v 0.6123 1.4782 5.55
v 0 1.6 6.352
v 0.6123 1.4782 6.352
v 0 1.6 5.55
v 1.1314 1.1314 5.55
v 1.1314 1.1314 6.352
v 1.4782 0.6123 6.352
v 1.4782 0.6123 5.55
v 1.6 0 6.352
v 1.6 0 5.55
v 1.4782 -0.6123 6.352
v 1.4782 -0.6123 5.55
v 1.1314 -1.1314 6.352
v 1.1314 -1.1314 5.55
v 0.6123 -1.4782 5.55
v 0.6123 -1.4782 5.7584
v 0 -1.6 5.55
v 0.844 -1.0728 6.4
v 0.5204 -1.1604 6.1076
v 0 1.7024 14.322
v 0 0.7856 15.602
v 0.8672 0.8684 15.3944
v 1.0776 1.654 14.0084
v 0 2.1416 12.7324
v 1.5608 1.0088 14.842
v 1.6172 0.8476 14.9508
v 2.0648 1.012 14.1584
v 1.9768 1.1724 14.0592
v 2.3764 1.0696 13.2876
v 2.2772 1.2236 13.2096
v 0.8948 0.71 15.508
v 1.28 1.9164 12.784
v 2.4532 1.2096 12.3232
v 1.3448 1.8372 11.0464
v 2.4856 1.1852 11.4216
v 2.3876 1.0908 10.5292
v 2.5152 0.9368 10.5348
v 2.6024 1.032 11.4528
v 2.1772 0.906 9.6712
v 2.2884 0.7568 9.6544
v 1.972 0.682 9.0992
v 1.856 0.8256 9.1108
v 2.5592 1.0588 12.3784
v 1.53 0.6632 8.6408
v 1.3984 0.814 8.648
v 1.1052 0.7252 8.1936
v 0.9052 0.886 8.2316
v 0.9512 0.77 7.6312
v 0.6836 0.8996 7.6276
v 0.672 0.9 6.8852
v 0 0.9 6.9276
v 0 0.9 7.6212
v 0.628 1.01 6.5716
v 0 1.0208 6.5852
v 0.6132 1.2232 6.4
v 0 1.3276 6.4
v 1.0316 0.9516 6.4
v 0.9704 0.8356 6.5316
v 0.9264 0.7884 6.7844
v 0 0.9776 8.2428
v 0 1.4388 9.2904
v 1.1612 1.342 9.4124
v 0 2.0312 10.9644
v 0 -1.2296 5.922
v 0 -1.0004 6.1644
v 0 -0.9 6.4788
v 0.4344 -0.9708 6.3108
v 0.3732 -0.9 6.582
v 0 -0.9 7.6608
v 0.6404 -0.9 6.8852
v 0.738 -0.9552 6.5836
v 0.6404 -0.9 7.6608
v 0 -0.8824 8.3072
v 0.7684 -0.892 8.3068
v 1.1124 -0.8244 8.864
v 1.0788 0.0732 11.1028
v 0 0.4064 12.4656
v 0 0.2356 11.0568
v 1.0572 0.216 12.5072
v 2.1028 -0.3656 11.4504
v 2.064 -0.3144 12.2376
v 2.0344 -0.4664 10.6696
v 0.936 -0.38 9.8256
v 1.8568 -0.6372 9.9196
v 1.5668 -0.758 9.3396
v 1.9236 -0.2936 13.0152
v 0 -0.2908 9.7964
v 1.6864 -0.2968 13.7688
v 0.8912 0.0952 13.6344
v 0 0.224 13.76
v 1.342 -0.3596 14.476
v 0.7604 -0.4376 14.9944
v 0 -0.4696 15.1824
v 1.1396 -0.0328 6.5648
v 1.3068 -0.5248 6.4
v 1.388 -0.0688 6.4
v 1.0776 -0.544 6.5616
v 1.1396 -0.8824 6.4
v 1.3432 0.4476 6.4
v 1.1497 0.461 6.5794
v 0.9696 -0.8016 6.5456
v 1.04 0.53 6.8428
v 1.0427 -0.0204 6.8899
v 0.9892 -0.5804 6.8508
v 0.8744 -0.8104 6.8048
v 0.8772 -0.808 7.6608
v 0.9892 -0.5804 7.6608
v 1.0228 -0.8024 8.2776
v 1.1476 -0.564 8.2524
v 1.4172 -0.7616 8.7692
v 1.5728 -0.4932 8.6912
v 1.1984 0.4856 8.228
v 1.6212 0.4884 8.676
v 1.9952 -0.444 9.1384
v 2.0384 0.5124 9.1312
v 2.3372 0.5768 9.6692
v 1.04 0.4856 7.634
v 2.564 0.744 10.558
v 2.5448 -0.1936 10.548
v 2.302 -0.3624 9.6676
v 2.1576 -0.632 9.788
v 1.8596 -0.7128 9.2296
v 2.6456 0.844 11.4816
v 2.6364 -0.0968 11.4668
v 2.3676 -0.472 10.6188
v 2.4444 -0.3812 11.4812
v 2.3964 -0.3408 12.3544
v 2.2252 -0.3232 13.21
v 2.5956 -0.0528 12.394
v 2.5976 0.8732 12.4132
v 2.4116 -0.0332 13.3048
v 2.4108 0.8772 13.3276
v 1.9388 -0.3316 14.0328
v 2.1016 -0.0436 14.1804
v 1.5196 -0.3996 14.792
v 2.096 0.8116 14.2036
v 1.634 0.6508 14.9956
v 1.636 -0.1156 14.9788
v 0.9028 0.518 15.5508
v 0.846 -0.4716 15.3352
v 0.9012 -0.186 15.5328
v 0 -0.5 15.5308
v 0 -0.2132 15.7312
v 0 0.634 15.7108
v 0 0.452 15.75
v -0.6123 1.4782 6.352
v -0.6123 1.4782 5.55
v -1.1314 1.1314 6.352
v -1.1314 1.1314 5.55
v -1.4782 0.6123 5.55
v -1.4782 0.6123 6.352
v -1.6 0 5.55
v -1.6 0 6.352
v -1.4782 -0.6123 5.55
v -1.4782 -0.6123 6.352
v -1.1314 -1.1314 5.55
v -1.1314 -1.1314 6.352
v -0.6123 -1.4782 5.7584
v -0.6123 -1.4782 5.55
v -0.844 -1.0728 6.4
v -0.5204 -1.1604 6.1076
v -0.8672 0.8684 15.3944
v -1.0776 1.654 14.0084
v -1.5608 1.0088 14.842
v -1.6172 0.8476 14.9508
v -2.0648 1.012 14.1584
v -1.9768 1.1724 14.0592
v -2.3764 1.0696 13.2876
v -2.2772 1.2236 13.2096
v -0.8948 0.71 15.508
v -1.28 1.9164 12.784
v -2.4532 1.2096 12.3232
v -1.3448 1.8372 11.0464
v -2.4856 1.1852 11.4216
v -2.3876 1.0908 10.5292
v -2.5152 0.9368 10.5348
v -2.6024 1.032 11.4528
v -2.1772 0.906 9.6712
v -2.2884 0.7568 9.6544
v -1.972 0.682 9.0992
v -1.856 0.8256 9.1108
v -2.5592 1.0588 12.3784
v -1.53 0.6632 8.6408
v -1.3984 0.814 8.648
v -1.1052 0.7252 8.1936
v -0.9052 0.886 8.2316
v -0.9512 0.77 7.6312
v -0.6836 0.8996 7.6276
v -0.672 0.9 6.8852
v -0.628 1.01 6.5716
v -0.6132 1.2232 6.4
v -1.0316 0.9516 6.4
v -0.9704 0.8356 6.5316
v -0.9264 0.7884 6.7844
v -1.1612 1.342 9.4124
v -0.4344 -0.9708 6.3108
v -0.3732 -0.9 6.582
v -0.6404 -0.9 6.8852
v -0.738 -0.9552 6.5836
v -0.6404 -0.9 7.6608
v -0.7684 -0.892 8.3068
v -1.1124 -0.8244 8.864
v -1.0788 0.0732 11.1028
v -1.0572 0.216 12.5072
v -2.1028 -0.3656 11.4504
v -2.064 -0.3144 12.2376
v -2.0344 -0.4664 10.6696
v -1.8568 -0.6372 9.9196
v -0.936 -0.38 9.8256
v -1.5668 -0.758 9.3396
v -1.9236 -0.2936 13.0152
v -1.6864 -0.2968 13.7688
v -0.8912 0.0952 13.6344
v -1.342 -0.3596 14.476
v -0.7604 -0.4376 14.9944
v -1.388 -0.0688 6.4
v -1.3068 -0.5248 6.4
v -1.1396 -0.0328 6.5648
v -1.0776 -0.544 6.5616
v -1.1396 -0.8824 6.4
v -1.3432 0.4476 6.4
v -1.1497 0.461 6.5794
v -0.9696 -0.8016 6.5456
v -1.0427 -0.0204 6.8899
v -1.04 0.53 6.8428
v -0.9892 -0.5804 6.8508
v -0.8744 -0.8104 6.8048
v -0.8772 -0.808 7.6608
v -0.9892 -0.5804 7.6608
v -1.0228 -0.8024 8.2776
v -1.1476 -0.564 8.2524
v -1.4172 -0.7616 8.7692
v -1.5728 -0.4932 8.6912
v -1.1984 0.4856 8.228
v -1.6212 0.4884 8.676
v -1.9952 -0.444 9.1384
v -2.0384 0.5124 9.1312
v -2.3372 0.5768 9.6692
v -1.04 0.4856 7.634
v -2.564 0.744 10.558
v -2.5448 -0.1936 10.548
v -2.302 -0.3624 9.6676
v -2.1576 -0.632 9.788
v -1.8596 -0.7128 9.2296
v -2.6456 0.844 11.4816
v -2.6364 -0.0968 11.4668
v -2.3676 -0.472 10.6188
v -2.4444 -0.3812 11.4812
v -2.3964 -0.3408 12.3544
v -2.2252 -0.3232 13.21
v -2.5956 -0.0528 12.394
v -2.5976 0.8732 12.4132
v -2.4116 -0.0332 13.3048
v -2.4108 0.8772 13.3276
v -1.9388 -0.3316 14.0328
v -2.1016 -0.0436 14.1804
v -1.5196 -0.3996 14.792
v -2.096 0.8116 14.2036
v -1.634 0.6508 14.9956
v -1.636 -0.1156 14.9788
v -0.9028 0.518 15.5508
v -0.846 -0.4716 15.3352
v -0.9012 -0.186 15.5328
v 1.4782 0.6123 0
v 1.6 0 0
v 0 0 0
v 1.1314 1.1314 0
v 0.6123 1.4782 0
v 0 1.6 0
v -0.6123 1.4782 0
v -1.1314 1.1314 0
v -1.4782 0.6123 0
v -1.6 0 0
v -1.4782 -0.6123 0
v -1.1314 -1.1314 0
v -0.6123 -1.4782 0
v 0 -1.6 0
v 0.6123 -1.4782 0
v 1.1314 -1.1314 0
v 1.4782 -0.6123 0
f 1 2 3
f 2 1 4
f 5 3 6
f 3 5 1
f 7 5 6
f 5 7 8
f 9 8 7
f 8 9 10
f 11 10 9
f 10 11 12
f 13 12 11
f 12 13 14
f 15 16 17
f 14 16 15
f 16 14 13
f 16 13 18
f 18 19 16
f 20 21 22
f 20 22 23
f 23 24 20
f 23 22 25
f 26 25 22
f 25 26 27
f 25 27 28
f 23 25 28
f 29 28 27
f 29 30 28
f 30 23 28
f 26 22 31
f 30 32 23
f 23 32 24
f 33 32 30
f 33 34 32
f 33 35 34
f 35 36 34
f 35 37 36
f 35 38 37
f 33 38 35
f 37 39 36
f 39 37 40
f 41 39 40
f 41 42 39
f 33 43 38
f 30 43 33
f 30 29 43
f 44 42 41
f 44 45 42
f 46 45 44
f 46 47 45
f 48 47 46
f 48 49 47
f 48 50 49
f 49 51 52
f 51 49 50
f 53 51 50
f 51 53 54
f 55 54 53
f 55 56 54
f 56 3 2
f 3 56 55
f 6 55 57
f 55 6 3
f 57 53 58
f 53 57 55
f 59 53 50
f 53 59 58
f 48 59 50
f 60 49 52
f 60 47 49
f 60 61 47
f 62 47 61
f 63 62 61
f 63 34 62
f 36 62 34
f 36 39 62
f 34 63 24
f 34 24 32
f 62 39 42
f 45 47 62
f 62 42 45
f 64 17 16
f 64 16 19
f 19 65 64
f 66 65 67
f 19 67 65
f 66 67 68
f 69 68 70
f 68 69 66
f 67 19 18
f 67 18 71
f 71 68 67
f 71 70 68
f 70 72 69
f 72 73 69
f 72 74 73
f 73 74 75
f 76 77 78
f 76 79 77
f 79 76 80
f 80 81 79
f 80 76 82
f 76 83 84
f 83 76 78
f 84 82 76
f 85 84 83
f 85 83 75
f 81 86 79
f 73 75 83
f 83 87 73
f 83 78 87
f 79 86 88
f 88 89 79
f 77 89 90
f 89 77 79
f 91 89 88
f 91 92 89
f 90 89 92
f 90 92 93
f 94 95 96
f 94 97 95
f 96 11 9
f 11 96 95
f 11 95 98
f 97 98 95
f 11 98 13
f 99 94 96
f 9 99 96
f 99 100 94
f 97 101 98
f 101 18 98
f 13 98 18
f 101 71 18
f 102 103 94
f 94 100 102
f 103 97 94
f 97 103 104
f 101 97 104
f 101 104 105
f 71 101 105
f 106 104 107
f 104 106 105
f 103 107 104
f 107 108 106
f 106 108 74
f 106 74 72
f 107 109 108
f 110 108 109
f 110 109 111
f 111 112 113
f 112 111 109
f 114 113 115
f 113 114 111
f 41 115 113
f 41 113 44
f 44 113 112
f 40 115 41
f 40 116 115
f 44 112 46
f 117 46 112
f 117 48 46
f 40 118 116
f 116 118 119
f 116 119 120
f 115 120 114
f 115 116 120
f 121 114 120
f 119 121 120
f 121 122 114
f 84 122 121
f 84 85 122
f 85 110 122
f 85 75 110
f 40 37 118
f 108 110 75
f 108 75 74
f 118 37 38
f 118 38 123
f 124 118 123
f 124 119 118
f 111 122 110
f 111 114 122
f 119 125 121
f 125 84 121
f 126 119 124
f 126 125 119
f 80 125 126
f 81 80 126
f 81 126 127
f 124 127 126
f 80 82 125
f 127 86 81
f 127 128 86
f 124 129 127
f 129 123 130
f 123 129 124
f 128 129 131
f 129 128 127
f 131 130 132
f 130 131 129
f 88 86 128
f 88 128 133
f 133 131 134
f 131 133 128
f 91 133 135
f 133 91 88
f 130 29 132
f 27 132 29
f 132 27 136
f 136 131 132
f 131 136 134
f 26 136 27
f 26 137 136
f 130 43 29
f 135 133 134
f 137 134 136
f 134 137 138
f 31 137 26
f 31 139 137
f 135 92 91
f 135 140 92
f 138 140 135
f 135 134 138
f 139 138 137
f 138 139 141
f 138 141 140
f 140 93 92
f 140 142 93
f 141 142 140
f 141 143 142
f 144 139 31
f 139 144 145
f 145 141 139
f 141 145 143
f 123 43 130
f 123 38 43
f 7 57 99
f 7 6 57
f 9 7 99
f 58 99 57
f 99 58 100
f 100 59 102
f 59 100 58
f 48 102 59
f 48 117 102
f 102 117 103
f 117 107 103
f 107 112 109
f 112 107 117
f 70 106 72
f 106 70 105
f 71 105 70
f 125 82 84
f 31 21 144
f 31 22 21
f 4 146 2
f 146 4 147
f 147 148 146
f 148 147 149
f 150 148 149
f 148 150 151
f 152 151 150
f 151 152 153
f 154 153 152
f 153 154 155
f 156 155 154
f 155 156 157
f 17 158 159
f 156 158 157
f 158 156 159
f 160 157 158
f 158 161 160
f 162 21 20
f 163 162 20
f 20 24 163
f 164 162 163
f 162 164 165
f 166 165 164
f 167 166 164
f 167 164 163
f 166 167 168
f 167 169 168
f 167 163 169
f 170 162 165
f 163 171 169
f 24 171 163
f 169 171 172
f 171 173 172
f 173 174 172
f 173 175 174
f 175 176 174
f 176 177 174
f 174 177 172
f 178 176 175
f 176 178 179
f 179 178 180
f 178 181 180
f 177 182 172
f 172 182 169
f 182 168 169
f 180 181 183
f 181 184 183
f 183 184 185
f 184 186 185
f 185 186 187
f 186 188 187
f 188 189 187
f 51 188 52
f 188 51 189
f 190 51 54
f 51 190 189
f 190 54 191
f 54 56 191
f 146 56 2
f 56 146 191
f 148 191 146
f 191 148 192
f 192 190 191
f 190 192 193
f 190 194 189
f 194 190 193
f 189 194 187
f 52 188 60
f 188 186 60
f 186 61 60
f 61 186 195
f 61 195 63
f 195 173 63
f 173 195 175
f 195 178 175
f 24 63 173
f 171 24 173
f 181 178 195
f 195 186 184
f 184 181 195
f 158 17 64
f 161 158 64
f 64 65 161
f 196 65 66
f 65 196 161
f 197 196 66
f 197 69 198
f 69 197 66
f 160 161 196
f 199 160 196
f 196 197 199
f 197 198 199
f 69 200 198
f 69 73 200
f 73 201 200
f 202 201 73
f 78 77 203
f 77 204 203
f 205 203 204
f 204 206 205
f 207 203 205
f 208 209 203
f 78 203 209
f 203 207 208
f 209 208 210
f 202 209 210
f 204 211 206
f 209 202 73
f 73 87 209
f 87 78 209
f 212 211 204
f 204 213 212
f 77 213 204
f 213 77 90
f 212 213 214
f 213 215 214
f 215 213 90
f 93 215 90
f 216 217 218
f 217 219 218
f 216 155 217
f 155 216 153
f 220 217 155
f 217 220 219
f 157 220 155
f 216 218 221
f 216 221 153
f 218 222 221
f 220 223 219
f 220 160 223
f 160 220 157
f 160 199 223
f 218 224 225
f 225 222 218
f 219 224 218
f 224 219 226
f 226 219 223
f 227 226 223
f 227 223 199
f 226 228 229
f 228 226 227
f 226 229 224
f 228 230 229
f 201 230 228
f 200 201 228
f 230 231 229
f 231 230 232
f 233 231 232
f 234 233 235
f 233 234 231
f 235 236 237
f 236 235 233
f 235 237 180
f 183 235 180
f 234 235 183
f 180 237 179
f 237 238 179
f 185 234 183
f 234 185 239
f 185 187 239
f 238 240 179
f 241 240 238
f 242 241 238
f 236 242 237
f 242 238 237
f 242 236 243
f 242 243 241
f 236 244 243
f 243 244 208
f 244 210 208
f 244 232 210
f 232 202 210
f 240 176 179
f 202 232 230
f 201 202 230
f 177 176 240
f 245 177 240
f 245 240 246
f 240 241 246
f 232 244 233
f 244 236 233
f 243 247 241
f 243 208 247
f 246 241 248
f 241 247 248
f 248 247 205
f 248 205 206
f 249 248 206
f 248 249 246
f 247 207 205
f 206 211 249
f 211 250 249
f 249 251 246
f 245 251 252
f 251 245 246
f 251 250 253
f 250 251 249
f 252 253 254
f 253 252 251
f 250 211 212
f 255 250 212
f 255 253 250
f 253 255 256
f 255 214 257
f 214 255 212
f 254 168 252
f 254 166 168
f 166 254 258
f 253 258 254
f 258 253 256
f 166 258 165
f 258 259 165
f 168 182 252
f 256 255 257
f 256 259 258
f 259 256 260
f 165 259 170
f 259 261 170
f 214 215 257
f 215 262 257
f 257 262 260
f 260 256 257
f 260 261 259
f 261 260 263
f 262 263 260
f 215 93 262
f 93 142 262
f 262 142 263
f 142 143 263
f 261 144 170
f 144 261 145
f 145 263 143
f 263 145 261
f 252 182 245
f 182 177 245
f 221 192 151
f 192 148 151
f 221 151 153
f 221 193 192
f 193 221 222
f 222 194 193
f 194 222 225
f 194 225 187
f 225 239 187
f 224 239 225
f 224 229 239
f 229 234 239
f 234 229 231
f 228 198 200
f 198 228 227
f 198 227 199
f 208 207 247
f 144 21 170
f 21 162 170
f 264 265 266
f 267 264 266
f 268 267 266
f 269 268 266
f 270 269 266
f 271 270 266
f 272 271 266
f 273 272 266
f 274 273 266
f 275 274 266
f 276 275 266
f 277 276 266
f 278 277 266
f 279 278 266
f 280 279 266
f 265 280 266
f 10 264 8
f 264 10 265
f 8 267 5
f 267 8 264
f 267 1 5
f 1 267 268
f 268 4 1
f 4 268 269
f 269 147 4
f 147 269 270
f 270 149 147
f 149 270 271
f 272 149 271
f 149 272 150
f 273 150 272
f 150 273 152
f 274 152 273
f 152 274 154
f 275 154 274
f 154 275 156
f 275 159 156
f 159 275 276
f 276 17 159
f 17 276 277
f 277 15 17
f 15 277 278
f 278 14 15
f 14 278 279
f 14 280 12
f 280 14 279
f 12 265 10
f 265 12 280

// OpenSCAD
use <../lib.scad>
use <../p/4-4cyli.scad>
use <../p/4-4disc.scad>
use <../p/4-4edge.scad>
use <s/80179s01.scad>
function ldraw_lib__80179() = [
// 0 Minifig Cutlery Spoon
// 0 Name: 80179.dat
// 0 Author: Magnus Forsberg [MagFors]
// 0 !LDRAW_ORG Part UPDATE 2026-03
// 0 !LICENSE Licensed under CC BY 4.0 : see CAreadme.txt
// 
// 0 BFC CERTIFY CCW
  [0,"BFC","CERTIFY"],
  [0,"BFC","CCW"],
// 
// 0 !CATEGORY Minifig Accessory
// 
// 0 !KEYWORDS Brickowl 232996, Mirror, Rearview, Wing mirror
// 
// 0 !HISTORY 2026-03-07 {LEGO Instructions App} Original part shape
// 0 !HISTORY 2026-03-07 [MagFors] File preparation for LDraw Parts Tracker
// 0 !HISTORY 2026-03-31 [OrionP] Official Update 2026-03
// 
// 1 16 0 0 0 1 0 0 0 1 0 0 0 1 s\80179s01.dat
  [1,16,0,0,0,1,0,0,0,1,0,0,0,1, ldraw_lib__s__80179s01()],
// 1 16 0 0 0 -1 0 0 0 1 0 0 0 1 s\80179s01.dat
  [1,16,0,0,0,-1,0,0,0,1,0,0,0,1, ldraw_lib__s__80179s01()],
// 1 16 0 0 0 4 0 0 0 -1 0 0 0 4 4-4edge.dat
  [1,16,0,0,0,4,0,0,0,-1,0,0,0,4, ldraw_lib__4_4edge()],
// 1 16 0 0 0 4 0 0 0 -1 0 0 0 4 4-4disc.dat
  [1,16,0,0,0,4,0,0,0,-1,0,0,0,4, ldraw_lib__4_4disc()],
// 1 16 0 0 0 4 0 0 0 -13.875 0 0 0 4 4-4cyli.dat
  [1,16,0,0,0,4,0,0,0,-13.875,0,0,0,4, ldraw_lib__4_4cyli()],
// 5 24 0 -39.005 1.964 0 -35.805 4.256 -2.168 -38.486 2.171 2.168 -38.486 2.171
  [5,24,0,-39.005,1.964,0,-35.805,4.256,-2.168,-38.486,2.171,2.168,-38.486,2.171],
// 5 24 0 -39.277 1.585 0 -39.005 1.964 -2.237 -38.77 1.775 2.237 -38.77 1.775
  [5,24,0,-39.277,1.585,0,-39.005,1.964,-2.237,-38.77,1.775,2.237,-38.77,1.775],
// 5 24 0 -35.805 4.256 0 -31.831 5.354 -2.694 -35.021 4.135 2.694 -35.021 4.135
  [5,24,0,-35.805,4.256,0,-31.831,5.354,-2.694,-35.021,4.135,2.694,-35.021,4.135],
// 5 24 0 -27.411 5.078 0 -31.831 5.354 -3.362 -27.616 4.593 3.362 -27.616 4.593
  [5,24,0,-27.411,5.078,0,-31.831,5.354,-3.362,-27.616,4.593,3.362,-27.616,4.593],
// 5 24 0 -23.226 3.597 0 -27.411 5.078 -2.903 -23.531 3.355 2.903 -23.531 3.355
  [5,24,0,-23.226,3.597,0,-27.411,5.078,-2.903,-23.531,3.355,2.903,-23.531,3.355],
// 5 24 0 -19.053 2.25 0 -20.607 2.444 1.709 -19.069 2.249 -1.709 -19.069 2.249
  [5,24,0,-19.053,2.25,0,-20.607,2.444,1.709,-19.069,2.249,-1.709,-19.069,2.249],
// 5 24 0 -20.607 2.444 0 -23.226 3.597 2.263 -20.579 2.215 -2.263 -20.579 2.215
  [5,24,0,-20.607,2.444,0,-23.226,3.597,2.263,-20.579,2.215,-2.263,-20.579,2.215],
// 5 24 0 -15.88 4 0 -13.875 4 -1.531 -15.88 3.696 1.531 -13.875 3.696
  [5,24,0,-15.88,4,0,-13.875,4,-1.531,-15.88,3.696,1.531,-13.875,3.696],
// 5 24 0 -38.827 -1.25 0 -37.956 -1.174 -2.115 -38.338 -1.179 2.115 -38.338 -1.179
  [5,24,0,-38.827,-1.25,0,-37.956,-1.174,-2.115,-38.338,-1.179,2.115,-38.338,-1.179],
// 5 24 0 -39.328 -.533 0 -38.827 -1.25 -2.253 -38.832 -.465 2.253 -38.832 -.465
  [5,24,0,-39.328,-.533,0,-38.827,-1.25,-2.253,-38.832,-.465,2.253,-38.832,-.465],
// 5 24 0 -39.375 1.13 0 -39.277 1.585 -2.257 -38.877 1.295 2.257 -38.877 1.295
  [5,24,0,-39.375,1.13,0,-39.277,1.585,-2.257,-38.877,1.295,2.257,-38.877,1.295],
// 5 24 0 -39.328 -0.533 0 -39.375 1.13 -2.253 -38.832 -0.465 2.253 -38.832 -0.465
  [5,24,0,-39.328,-0.533,0,-39.375,1.13,-2.253,-38.832,-0.465,2.253,-38.832,-0.465],
// 5 24 0 -14.805 -3.074 0 -15.411 -2.501 -1.301 -15.269 -2.901 1.301 -15.269 -2.901
  [5,24,0,-14.805,-3.074,0,-15.411,-2.501,-1.301,-15.269,-2.901,1.301,-15.269,-2.901],
// 5 24 0 -15.411 -2.501 0 -16.197 -2.25 -1.086 -15.777 -2.427 1.086 -15.777 -2.427
  [5,24,0,-15.411,-2.501,0,-16.197,-2.25,-1.086,-15.777,-2.427,1.086,-15.777,-2.427],
// 5 24 0 -24.491 -0.727 0 -27.642 0.589 -2.34 -24.564 -0.95 2.34 -24.564 -0.95
  [5,24,0,-24.491,-0.727,0,-27.642,0.589,-2.34,-24.564,-0.95,2.34,-24.564,-0.95],
// 5 24 0 -27.642 0.589 0 -31.164 1.016 -2.697 -27.757 0.183 2.697 -27.757 0.183
  [5,24,0,-27.642,0.589,0,-31.164,1.016,-2.697,-27.757,0.183,2.697,-27.757,0.183],
// 5 24 0 -34.4 .56 0 -31.164 1.016 -2.238 -34.11 .273 2.228 -34.086 .238
  [5,24,0,-34.4,.56,0,-31.164,1.016,-2.238,-34.11,.273,2.228,-34.086,.238],
// 5 24 0 -37.956 -1.174 0 -34.4 0.56 1.901 -37.486 -1.094 -1.901 -37.486 -1.094
  [5,24,0,-37.956,-1.174,0,-34.4,0.56,1.901,-37.486,-1.094,-1.901,-37.486,-1.094],
// 5 24 0 -24.491 -.727 0 -20.768 -2.206 -2.34 -24.564 -.95 2.34 -24.564 -.95
  [5,24,0,-24.491,-.727,0,-20.768,-2.206,-2.34,-24.564,-.95,2.34,-24.564,-.95],
// 5 24 0 -16 3.319 0 -16.463 2.552 -1.533 -16 3.058 1.533 -16 3.058
  [5,24,0,-16,3.319,0,-16.463,2.552,-1.533,-16,3.058,1.533,-16,3.058],
// 5 24 0 -14.805 -3.074 0 -13.875 -4 -1.5308 -14.3959 -3.6956 1.5308 -14.3959 -3.6956
  [5,24,0,-14.805,-3.074,0,-13.875,-4,-1.5308,-14.3959,-3.6956,1.5308,-14.3959,-3.6956],
// 5 24 0 -17.319 2.25 0 -16.463 2.552 1.68 -17.213 2.25 -1.68 -17.213 2.25
  [5,24,0,-17.319,2.25,0,-16.463,2.552,1.68,-17.213,2.25,-1.68,-17.213,2.25],
// 5 24 0 -16 3.319 0 -15.88 4 -1.533 -16 3.058 1.533 -16 3.058
  [5,24,0,-16,3.319,0,-15.88,4,-1.533,-16,3.058,1.533,-16,3.058],
];
module ldraw_lib__80179(step=0, col=false, unit=2/5, alt=false, line=0.2, solid=!$preview)
    makepoly(ldraw_lib__80179(), step=step, col=col, unit=unit, alt=alt, line=line, solid=solid);
ldraw_lib__80179(line=0.2);
